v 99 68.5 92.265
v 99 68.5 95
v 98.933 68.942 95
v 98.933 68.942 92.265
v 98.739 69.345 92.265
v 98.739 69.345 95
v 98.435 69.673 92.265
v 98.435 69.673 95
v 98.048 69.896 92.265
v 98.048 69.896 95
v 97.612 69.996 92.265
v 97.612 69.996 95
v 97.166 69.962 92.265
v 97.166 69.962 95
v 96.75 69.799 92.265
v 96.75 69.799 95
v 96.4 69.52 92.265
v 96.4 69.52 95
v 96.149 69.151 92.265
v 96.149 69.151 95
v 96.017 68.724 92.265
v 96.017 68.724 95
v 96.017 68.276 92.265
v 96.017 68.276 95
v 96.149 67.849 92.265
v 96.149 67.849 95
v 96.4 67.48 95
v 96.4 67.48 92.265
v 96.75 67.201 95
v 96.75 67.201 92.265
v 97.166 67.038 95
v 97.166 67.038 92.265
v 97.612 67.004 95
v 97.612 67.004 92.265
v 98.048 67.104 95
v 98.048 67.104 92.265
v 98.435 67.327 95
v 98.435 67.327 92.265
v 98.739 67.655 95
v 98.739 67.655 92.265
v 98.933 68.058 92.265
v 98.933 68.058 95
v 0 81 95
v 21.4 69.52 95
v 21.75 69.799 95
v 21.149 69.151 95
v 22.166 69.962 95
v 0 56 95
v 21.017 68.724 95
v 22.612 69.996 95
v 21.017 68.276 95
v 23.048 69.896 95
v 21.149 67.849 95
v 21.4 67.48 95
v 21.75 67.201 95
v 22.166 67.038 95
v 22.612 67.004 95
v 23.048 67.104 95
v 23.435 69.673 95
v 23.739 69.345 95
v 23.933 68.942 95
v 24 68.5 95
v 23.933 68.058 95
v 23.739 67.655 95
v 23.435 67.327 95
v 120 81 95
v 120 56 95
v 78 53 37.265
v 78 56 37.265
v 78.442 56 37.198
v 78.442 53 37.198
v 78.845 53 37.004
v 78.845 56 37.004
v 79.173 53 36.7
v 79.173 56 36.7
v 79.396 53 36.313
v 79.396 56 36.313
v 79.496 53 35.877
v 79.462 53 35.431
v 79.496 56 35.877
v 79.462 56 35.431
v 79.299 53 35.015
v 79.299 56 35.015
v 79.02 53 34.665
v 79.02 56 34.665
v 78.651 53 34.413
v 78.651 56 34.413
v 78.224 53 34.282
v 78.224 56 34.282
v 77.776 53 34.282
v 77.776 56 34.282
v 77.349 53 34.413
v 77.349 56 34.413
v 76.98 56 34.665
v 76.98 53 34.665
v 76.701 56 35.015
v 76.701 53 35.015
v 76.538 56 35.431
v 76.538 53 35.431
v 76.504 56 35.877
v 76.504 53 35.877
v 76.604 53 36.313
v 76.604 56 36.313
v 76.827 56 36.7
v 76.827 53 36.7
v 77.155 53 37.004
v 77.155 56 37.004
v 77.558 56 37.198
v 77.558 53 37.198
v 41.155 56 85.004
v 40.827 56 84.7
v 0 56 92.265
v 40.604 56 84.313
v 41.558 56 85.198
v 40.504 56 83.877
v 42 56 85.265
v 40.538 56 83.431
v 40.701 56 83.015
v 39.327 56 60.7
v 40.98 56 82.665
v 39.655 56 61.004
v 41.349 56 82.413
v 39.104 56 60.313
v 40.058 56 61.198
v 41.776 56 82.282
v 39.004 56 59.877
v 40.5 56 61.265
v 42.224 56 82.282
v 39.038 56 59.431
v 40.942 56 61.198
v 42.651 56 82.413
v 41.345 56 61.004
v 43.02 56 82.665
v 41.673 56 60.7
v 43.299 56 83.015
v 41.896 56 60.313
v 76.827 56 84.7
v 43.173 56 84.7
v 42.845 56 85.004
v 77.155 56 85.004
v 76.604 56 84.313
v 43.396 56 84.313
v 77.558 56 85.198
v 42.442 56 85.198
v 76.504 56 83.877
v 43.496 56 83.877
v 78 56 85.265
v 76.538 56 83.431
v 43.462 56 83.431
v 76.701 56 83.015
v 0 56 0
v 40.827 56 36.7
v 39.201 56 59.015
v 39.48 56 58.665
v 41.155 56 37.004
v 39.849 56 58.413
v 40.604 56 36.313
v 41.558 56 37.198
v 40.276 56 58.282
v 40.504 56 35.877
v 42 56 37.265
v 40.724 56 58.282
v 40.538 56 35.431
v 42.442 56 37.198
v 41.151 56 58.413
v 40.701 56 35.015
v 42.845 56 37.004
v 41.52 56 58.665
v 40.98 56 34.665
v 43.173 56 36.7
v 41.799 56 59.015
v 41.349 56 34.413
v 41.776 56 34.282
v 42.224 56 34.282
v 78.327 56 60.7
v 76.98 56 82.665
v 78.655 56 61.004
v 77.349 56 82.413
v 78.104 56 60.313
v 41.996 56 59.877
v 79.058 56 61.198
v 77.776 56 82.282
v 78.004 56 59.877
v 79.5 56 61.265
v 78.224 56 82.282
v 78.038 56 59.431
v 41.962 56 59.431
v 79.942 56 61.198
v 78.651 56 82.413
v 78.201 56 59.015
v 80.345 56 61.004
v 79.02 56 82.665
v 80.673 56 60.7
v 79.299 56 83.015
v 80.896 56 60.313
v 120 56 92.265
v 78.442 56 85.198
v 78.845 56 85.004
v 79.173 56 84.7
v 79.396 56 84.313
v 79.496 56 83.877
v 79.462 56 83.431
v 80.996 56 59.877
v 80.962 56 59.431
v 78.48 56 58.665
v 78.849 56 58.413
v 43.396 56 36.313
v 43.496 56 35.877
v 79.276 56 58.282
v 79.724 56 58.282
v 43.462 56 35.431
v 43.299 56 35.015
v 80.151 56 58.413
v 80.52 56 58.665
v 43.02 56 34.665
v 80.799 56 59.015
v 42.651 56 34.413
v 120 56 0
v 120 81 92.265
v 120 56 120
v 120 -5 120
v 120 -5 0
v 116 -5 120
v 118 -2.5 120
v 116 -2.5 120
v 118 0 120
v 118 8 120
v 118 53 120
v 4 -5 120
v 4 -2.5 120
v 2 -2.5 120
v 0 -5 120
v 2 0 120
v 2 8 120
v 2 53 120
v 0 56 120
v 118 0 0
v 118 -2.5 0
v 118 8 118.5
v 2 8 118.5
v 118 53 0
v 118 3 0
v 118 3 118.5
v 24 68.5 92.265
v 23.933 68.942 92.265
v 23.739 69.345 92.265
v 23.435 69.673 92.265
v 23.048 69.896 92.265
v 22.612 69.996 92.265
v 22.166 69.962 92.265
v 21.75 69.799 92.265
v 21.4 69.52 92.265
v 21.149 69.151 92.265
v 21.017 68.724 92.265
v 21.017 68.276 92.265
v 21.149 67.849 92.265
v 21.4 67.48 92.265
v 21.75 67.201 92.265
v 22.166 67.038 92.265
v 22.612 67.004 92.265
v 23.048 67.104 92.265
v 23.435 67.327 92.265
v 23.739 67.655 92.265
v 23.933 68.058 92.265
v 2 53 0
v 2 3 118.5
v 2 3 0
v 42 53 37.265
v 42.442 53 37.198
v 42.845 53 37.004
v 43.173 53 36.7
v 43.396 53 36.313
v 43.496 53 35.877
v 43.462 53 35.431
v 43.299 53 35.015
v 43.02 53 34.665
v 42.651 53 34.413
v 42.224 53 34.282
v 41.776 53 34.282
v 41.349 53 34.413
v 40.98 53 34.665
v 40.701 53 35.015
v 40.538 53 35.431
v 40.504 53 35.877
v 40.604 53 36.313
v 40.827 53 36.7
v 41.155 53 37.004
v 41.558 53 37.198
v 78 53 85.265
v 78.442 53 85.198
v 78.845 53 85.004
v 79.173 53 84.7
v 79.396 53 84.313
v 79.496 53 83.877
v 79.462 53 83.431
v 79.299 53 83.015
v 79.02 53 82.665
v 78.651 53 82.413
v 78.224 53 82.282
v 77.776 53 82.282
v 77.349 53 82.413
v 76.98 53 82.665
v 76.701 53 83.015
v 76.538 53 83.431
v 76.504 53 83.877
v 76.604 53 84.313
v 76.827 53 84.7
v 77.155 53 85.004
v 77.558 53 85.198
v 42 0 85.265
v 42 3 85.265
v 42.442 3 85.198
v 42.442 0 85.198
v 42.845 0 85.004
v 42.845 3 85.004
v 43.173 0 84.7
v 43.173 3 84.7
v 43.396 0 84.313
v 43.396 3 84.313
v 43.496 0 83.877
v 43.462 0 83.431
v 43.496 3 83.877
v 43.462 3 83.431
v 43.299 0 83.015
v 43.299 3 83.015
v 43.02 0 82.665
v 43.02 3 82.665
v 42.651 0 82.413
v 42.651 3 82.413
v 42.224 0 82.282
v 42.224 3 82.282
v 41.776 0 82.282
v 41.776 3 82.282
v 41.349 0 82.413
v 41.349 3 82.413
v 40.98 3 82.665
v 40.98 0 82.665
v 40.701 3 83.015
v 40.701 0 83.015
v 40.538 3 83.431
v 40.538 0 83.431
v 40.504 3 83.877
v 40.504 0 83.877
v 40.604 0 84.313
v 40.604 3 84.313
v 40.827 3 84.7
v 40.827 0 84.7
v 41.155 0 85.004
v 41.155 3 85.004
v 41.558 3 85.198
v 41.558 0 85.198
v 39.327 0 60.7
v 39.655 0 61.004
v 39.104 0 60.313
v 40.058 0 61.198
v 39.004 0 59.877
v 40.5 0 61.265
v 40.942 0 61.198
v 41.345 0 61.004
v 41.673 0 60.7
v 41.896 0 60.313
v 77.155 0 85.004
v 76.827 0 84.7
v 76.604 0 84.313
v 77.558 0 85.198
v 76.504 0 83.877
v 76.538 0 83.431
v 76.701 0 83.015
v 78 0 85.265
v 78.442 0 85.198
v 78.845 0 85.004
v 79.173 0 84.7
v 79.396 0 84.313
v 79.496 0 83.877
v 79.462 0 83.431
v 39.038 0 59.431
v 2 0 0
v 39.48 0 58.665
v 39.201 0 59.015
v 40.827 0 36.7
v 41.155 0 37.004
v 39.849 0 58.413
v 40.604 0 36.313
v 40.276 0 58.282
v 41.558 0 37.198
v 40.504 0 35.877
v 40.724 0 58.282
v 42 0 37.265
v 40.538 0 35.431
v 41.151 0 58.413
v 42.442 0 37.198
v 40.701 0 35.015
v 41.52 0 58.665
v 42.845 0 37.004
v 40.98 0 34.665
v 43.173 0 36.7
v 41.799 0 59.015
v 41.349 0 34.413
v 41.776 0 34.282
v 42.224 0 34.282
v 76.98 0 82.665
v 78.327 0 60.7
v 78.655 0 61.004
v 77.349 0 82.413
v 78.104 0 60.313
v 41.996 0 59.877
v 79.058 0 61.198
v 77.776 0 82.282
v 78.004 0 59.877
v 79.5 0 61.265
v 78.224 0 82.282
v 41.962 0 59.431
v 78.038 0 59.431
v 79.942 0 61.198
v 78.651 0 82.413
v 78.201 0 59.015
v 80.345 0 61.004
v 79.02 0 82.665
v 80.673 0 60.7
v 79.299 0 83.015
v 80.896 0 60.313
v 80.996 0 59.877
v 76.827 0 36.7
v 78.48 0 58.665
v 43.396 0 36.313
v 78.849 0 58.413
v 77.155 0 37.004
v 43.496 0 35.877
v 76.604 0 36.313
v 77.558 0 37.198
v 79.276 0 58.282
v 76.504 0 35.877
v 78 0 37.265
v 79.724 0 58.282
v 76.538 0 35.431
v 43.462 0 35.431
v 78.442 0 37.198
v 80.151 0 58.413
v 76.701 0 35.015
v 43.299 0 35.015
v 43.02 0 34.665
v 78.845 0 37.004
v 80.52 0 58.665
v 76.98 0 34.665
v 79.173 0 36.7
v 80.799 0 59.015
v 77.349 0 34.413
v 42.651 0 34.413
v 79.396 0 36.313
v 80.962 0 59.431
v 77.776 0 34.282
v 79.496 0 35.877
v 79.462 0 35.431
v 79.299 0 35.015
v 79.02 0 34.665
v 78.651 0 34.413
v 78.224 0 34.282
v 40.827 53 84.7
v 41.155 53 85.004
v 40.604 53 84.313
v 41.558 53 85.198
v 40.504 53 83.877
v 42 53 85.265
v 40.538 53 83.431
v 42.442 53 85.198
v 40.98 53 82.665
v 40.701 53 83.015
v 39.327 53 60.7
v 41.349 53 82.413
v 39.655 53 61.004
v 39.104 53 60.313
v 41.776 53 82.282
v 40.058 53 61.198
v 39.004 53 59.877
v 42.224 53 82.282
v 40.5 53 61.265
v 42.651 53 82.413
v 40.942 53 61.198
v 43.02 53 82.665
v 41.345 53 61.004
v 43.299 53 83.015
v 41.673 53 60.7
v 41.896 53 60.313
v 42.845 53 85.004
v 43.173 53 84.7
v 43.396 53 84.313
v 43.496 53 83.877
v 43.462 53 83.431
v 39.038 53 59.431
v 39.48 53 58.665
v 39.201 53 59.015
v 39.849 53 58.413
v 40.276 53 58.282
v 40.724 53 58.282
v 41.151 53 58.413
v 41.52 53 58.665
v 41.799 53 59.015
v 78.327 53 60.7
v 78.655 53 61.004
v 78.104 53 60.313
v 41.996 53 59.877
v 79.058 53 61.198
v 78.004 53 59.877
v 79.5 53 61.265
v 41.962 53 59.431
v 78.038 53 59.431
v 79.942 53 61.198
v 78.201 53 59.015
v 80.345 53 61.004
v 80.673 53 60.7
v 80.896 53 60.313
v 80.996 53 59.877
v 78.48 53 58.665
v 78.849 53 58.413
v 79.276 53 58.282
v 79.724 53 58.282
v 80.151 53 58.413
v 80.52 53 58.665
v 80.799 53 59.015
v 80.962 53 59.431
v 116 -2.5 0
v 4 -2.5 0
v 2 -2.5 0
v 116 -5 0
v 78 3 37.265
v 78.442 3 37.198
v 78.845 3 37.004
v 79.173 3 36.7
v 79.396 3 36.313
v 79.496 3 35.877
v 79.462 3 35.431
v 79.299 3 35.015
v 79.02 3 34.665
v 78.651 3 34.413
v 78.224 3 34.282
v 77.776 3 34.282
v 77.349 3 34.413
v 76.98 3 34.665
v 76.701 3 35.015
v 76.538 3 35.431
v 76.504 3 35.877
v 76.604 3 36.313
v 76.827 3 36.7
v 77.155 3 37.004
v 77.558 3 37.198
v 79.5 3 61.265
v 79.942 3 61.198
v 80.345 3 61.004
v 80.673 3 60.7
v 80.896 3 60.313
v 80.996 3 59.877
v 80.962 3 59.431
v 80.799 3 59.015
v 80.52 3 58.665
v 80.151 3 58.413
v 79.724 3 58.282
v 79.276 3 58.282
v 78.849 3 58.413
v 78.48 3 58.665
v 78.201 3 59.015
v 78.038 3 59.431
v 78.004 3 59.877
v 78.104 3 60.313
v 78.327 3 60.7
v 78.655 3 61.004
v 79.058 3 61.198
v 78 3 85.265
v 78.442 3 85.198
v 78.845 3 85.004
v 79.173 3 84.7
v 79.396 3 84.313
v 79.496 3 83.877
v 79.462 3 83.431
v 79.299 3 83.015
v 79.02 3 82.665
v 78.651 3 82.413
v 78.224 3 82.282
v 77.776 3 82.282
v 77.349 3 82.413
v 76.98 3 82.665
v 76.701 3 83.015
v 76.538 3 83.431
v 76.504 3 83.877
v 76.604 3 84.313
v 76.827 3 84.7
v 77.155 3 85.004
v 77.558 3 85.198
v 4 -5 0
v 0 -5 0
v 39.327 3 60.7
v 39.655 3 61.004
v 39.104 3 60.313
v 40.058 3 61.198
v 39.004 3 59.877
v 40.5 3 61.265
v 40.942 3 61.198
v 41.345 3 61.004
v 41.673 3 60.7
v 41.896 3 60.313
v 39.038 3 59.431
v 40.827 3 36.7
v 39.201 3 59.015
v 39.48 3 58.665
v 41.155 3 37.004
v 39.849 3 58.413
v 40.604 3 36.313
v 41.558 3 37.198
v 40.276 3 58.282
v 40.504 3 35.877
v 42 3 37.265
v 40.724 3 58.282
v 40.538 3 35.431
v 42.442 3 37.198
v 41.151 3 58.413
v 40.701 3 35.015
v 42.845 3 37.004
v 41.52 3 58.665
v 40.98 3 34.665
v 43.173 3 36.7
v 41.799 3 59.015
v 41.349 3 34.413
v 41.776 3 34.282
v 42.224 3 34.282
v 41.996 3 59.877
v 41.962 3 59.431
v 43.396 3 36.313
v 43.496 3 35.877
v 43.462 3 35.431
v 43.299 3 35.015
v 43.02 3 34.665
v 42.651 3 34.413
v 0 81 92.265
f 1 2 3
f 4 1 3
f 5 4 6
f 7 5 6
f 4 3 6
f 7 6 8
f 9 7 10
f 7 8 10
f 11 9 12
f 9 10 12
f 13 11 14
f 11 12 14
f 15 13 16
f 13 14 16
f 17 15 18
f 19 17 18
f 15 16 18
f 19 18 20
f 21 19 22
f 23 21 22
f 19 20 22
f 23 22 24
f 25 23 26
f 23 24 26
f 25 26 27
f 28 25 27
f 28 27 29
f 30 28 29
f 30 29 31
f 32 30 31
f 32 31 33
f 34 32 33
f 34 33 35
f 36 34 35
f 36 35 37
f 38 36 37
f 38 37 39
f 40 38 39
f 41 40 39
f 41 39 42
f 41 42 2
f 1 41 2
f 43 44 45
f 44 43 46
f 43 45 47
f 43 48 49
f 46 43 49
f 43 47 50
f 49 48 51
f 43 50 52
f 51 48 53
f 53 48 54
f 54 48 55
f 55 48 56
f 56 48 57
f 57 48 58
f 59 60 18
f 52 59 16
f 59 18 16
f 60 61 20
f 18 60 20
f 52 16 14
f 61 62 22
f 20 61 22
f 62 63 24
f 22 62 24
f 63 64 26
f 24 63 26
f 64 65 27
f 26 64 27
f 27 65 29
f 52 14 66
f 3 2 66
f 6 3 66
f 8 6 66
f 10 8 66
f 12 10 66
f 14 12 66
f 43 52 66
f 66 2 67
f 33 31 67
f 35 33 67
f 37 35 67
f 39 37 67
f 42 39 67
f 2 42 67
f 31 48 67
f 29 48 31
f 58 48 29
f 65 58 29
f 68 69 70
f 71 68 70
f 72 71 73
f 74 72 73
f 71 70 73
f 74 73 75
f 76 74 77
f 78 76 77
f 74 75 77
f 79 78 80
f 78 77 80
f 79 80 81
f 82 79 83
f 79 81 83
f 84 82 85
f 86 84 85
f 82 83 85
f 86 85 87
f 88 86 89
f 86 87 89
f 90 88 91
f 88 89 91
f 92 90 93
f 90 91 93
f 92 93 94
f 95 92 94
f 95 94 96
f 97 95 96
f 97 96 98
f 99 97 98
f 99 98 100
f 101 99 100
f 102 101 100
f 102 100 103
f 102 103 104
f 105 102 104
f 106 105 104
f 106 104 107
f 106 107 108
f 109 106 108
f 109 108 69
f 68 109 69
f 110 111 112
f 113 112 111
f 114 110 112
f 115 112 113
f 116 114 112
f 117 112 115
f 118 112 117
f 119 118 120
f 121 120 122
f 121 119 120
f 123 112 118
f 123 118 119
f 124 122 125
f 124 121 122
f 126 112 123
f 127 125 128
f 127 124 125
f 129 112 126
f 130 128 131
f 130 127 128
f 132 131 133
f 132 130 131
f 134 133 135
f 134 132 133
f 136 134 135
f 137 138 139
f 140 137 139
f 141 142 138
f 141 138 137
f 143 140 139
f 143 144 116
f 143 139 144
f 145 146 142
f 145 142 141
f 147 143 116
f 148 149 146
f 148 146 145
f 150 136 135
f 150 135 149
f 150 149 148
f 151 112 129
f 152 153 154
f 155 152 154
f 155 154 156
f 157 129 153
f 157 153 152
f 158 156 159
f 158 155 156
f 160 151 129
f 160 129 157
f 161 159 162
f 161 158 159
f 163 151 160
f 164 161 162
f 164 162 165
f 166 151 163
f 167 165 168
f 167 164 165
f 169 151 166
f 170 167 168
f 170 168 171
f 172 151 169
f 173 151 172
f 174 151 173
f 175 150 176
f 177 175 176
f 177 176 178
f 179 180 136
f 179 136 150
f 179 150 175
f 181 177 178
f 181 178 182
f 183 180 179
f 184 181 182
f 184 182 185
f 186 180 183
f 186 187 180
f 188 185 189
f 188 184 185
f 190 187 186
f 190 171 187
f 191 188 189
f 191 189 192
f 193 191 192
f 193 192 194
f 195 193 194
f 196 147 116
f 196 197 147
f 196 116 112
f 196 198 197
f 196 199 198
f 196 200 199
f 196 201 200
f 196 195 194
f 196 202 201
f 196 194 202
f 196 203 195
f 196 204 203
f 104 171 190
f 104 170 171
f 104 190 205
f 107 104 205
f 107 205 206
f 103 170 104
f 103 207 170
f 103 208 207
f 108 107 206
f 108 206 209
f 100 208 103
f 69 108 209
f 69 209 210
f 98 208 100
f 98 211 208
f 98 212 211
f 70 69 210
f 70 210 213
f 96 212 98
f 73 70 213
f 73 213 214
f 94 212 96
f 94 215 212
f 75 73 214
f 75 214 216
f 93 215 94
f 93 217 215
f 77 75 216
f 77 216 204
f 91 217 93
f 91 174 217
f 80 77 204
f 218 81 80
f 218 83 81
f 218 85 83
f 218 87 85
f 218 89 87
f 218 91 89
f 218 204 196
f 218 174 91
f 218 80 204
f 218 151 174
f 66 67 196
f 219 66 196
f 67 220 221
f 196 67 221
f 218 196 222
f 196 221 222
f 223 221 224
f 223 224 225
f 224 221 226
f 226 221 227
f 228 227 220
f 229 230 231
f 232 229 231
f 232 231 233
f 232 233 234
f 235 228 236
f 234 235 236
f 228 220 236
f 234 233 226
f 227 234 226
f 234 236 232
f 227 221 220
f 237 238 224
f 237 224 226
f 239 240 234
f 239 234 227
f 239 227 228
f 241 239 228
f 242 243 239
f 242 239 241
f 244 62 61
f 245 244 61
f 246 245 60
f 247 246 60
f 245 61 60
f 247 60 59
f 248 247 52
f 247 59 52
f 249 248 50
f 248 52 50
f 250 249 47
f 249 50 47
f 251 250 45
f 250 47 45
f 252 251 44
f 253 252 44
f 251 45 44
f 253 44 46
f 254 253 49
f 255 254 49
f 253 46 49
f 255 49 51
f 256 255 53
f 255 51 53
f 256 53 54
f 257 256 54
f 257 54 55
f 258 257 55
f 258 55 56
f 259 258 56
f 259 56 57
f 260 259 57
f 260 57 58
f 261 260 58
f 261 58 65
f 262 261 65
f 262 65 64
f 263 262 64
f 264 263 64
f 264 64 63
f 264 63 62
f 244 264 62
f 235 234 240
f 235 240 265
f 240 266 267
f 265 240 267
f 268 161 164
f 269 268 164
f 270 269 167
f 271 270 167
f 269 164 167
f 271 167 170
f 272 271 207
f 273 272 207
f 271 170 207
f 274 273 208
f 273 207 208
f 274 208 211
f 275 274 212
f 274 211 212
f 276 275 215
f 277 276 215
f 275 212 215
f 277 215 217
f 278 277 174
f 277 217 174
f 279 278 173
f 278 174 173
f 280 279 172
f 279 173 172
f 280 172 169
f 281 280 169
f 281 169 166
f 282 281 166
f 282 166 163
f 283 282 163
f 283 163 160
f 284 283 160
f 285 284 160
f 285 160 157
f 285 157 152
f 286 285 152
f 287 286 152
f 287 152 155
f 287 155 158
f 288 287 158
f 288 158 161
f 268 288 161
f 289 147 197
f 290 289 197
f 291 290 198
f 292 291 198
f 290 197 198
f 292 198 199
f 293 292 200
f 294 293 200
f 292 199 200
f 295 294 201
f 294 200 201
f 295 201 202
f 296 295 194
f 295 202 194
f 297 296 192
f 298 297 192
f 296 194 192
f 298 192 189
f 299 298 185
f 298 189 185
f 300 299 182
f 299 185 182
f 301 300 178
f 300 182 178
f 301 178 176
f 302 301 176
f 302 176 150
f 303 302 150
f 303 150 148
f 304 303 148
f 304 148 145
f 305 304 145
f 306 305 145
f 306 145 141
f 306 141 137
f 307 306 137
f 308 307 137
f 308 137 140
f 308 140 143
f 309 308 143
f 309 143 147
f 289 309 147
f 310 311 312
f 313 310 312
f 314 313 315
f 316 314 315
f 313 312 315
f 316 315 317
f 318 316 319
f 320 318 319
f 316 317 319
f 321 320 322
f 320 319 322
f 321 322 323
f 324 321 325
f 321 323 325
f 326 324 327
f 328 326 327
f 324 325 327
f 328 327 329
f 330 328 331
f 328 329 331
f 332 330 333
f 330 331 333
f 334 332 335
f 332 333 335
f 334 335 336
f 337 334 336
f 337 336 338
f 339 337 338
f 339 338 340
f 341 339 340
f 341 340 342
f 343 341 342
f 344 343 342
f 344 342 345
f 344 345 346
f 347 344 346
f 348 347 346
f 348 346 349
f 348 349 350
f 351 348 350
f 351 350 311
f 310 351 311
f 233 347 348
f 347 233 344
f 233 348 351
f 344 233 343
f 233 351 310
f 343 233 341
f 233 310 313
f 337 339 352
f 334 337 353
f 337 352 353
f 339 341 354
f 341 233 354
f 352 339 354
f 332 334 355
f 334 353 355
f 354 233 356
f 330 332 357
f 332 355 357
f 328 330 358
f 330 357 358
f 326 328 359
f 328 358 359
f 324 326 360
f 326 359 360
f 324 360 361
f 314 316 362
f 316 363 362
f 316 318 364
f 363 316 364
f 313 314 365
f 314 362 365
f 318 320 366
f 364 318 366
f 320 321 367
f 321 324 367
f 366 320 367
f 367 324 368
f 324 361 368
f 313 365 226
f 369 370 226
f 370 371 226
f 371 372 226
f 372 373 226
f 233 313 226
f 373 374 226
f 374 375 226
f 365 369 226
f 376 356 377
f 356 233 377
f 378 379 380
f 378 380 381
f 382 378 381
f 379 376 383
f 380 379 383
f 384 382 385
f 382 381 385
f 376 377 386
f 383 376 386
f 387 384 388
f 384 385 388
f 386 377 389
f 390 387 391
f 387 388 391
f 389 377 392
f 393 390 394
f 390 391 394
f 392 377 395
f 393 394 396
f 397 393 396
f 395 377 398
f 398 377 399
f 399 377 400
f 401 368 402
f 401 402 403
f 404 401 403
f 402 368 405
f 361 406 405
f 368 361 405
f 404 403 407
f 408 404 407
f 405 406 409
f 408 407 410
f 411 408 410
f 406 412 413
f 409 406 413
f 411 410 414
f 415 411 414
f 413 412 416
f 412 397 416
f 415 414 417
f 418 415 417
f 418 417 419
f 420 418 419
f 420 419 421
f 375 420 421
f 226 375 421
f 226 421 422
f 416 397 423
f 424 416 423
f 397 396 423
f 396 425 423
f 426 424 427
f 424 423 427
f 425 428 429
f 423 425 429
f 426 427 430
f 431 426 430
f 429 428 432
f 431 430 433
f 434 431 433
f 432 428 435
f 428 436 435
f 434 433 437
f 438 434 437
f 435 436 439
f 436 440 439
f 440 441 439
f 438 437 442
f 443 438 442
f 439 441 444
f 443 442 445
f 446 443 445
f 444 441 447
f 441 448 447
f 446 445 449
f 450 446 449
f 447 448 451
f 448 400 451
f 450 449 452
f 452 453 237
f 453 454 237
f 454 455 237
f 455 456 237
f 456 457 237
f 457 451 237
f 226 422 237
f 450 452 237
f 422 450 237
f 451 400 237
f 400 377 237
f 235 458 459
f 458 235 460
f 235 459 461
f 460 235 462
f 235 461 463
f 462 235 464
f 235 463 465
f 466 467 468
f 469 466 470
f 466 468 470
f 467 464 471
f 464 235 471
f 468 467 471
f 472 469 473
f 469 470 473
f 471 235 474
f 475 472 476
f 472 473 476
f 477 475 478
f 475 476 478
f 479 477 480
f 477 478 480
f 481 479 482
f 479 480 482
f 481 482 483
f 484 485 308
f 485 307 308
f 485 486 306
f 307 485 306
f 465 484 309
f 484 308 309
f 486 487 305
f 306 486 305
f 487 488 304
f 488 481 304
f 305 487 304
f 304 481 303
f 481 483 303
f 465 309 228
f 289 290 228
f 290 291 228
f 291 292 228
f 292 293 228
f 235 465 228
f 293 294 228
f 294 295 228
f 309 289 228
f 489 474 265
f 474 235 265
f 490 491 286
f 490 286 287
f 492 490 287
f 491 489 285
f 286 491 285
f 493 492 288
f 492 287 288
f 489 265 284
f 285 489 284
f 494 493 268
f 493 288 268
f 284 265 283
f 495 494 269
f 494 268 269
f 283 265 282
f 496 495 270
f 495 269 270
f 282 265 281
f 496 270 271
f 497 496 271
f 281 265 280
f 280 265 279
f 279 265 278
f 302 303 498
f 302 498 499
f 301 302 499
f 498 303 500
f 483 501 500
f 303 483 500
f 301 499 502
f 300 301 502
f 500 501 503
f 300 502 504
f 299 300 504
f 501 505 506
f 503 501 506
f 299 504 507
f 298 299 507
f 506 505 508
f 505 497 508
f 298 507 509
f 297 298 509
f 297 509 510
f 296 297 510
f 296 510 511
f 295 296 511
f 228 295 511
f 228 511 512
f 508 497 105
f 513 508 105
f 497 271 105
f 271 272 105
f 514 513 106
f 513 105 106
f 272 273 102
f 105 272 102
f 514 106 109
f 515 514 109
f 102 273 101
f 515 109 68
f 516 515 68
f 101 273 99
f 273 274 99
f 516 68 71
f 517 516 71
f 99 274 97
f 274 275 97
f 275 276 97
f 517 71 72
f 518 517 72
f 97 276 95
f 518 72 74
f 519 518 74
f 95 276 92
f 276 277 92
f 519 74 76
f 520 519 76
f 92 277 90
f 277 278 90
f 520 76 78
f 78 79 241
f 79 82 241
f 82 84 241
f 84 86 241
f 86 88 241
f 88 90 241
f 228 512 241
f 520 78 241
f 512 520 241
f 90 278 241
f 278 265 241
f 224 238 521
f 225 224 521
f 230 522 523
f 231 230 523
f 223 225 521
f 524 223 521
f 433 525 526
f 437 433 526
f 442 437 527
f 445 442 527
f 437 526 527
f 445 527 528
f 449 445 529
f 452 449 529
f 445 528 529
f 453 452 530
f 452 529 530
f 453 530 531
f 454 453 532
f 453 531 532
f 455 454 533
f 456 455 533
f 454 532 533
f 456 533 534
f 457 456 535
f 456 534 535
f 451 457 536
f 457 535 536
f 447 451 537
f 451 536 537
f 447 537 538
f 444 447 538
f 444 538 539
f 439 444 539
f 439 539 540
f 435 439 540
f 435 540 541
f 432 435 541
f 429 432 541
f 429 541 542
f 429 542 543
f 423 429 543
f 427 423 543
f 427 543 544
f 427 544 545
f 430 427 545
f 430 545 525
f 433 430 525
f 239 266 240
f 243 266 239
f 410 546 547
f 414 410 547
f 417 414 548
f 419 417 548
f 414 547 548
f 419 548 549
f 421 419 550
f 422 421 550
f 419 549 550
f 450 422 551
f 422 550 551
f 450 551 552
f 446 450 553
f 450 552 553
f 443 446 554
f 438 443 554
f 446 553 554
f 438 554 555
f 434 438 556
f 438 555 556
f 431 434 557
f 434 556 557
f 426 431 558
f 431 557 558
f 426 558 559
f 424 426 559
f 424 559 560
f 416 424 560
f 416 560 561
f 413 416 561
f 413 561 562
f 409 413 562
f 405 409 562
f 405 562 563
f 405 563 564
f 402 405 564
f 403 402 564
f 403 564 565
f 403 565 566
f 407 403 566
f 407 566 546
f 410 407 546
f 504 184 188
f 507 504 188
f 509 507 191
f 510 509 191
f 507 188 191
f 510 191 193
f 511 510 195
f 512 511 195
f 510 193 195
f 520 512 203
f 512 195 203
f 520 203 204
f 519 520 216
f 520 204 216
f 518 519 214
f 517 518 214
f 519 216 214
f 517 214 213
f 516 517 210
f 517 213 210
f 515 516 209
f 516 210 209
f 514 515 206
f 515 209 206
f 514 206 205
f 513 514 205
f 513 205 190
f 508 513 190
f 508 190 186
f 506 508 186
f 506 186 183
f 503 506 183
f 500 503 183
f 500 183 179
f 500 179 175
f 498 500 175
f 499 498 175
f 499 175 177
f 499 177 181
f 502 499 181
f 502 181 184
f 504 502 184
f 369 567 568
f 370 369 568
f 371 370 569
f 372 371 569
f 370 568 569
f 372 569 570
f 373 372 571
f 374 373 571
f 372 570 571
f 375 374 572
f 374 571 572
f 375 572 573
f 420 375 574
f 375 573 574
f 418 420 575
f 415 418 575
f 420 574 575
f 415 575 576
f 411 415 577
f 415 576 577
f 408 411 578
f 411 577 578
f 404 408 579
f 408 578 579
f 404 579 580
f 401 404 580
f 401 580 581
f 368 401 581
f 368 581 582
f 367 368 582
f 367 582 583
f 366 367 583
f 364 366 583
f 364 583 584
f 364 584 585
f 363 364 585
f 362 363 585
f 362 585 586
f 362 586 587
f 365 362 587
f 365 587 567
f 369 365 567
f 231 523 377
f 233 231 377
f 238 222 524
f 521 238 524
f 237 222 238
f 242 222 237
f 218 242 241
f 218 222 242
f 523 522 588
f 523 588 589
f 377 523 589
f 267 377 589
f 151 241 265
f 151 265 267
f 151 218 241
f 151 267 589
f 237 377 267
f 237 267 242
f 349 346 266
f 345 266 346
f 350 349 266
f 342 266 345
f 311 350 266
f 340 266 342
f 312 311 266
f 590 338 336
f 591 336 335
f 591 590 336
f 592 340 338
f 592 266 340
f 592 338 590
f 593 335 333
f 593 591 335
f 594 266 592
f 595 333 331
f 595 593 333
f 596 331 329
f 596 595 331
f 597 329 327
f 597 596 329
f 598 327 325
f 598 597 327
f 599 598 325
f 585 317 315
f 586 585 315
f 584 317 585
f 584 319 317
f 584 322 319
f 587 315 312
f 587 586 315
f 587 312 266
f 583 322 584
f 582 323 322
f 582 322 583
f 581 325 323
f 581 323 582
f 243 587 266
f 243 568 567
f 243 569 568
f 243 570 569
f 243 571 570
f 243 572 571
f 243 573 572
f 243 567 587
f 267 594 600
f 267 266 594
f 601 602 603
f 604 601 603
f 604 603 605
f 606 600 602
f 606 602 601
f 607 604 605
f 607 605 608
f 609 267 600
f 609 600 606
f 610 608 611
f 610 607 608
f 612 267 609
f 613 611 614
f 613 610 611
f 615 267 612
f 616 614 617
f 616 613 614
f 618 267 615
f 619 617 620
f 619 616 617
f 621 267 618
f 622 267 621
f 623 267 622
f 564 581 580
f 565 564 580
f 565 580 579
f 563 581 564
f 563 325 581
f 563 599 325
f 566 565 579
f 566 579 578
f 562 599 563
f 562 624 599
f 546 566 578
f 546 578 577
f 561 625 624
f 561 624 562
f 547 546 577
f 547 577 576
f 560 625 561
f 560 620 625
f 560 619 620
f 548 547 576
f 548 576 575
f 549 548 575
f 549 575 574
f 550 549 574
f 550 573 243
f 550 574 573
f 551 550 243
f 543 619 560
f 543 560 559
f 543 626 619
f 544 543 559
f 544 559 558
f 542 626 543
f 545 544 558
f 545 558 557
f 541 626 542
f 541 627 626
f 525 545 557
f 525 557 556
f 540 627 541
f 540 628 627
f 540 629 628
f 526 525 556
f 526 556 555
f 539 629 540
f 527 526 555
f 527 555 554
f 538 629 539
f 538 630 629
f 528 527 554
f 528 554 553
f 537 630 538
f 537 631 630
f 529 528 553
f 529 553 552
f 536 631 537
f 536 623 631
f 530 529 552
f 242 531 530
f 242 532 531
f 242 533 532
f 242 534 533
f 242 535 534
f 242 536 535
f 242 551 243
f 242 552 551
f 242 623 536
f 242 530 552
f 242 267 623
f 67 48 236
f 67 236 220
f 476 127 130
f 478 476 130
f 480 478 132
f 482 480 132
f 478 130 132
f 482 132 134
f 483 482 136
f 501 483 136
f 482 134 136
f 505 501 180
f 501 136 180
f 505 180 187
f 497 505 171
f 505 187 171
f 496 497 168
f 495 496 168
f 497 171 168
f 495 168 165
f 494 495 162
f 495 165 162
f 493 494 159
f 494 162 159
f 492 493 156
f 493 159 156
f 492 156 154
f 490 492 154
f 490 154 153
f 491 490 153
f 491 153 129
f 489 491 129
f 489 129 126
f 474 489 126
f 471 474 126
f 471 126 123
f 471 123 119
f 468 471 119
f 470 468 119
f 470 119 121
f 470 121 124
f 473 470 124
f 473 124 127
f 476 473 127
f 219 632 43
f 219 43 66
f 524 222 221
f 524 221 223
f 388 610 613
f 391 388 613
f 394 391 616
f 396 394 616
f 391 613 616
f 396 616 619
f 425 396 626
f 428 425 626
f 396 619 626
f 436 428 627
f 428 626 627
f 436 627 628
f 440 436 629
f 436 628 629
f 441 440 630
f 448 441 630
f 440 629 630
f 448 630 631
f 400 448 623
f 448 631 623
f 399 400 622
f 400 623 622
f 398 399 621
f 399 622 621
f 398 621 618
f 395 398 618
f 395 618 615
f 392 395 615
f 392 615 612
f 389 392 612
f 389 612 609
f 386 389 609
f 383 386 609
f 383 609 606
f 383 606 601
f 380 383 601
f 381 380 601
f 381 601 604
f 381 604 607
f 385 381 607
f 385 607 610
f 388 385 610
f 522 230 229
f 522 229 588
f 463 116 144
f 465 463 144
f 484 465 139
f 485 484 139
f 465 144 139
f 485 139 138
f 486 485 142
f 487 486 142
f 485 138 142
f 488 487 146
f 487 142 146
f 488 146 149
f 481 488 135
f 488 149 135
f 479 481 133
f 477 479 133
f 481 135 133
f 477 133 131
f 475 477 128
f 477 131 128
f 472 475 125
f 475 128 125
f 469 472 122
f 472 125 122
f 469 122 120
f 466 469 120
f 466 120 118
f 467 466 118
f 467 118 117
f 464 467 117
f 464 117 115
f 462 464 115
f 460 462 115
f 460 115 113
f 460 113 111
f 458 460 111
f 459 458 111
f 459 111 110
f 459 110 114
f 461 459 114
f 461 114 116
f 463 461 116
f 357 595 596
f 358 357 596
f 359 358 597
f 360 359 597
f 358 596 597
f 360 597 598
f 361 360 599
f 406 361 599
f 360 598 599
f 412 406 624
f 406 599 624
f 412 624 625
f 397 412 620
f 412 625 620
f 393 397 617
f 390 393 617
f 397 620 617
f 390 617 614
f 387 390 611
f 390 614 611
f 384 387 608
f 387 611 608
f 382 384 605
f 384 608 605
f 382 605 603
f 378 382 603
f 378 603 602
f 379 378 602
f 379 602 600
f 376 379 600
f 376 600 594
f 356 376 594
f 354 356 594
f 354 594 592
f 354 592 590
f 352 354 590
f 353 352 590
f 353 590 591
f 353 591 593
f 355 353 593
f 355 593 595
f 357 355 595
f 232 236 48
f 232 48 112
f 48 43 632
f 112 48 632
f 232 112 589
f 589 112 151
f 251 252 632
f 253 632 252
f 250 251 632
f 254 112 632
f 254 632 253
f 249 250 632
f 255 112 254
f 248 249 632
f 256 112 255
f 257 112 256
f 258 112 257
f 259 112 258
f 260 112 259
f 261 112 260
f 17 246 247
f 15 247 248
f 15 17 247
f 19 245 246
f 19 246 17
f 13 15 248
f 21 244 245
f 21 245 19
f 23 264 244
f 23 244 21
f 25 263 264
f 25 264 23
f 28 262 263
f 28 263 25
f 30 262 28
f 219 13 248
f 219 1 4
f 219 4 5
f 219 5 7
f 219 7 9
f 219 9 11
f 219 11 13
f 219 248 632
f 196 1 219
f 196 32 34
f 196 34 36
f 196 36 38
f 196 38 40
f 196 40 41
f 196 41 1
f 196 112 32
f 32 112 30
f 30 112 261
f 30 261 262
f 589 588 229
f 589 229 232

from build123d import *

# Parameters (mm, degrees)
SKETCH_2_W          = 120
SKETCH_2_H          = 120
EXTRUDE_1_DEPTH     = 3
SKETCH_5_W          = 2
SKETCH_5_H          = 120
EXTRUDE_3_DEPTH     = 50
SKETCH_6_W          = 120
SKETCH_6_H          = 120
EXTRUDE_4_DEPTH     = 3
SKETCH_7_W          = 116
SKETCH_7_H          = 1.5
EXTRUDE_5_DEPTH     = 5
SKETCH_9_W          = 120
SKETCH_9_H          = 2.735218368
EXTRUDE_6_DEPTH     = 25
SKETCH_11_R         = 1.5
CUT_EXTRUDE_1_DEPTH = 58
SKETCH_10_R         = 1.5
CUT_EXTRUDE_2_DEPTH = 3
SKETCH_13_W         = 4
SKETCH_13_H         = 120
EXTRUDE_10_DEPTH    = 5
SKETCH_14_W         = 2
SKETCH_14_H         = 2.5
CUT_EXTRUDE_3_DEPTH = 120


with BuildPart() as part:
    # 草图2 → 凸台-拉伸1 (new body)
    with BuildSketch(Plane(origin=(0, 0, 0), x_dir=(1, 0, 0), z_dir=(0, 1, 0))):
        with Locations((60, -60)):
            Rectangle(SKETCH_2_W, SKETCH_2_H)
    extrude(amount=EXTRUDE_1_DEPTH)

    # 草图5 → 凸台-拉伸3 (add)
    with BuildSketch(Plane(origin=(0, 3, 0), x_dir=(1, 0, 0), z_dir=(0, 1, 0))):
        with Locations((1, -60)):
            Rectangle(SKETCH_5_W, SKETCH_5_H)
        with Locations((119, -60)):
            Rectangle(SKETCH_5_W, SKETCH_5_H)
    extrude(amount=EXTRUDE_3_DEPTH)

    # 草图6 → 凸台-拉伸4 (add)
    with BuildSketch(Plane(origin=(0, 53, 0), x_dir=(1, 0, 0), z_dir=(0, 1, 0))):
        with Locations((60, -60)):
            Rectangle(SKETCH_6_W, SKETCH_6_H)
    extrude(amount=EXTRUDE_4_DEPTH)

    # 草图7 → 凸台-拉伸5 (add)
    with BuildSketch(Plane(origin=(0, 3, 0), x_dir=(1, 0, 0), z_dir=(0, 1, 0))):
        with Locations((60, -119.25)):
            Rectangle(SKETCH_7_W, SKETCH_7_H)
    extrude(amount=EXTRUDE_5_DEPTH)

    # 草图9 → 凸台-拉伸6 (add)
    with BuildSketch(Plane(origin=(0, 56, 0), x_dir=(1, 0, 0), z_dir=(0, 1, 0))):
        with Locations((60, -93.632390816)):
            Rectangle(SKETCH_9_W, SKETCH_9_H)
    extrude(amount=EXTRUDE_6_DEPTH)

    # 草图11 → 切除-拉伸1 (cut)
    with BuildSketch(Plane(origin=(0, 56, 0), x_dir=(1, 0, 0), z_dir=(0, 1, 0))):
        with Locations(Location((42, -35.764781632, 0), (0, 0, 270))):
            Circle(SKETCH_11_R)
        with Locations(Location((40.5, -59.764781632, 0), (0, 0, 270))):
            Circle(SKETCH_11_R)
        with Locations(Location((42, -83.764781632, 0), (0, 0, 270))):
            Circle(SKETCH_11_R)
        with Locations(Location((79.5, -59.764781632, 0), (0, 0, 270))):
            Circle(SKETCH_11_R)
        with Locations(Location((78, -83.764781632, 0), (0, 0, 270))):
            Circle(SKETCH_11_R)
        with Locations(Location((78, -35.764781632, 0), (0, 0, 270))):
            Circle(SKETCH_11_R)
    extrude(amount=-CUT_EXTRUDE_1_DEPTH, mode=Mode.SUBTRACT)

    # 草图10 → 切除-拉伸2 (cut)
    with BuildSketch(Plane.XY.offset(95)):
        with Locations((22.5, 68.5)):
            Circle(SKETCH_10_R)
        with Locations((97.5, 68.5)):
            Circle(SKETCH_10_R)
    extrude(amount=-CUT_EXTRUDE_2_DEPTH, mode=Mode.SUBTRACT)

    # 草图13 → 凸台-拉伸10 (add)
    with BuildSketch(Plane(origin=(0, 0, 0), x_dir=(-1, 0, 0), z_dir=(0, -1, 0))):
        with Locations((-2, -60)):
            Rectangle(SKETCH_13_W, SKETCH_13_H)
        with Locations((-118, -60)):
            Rectangle(SKETCH_13_W, SKETCH_13_H)
    extrude(amount=EXTRUDE_10_DEPTH)

    # 草图14 → 切除-拉伸3 (cut)
    with BuildSketch(Plane(origin=(0, 0, 0), x_dir=(-1, 0, 0), z_dir=(0, 0, -1))):
        with Locations((-117, -1.25)):
            Rectangle(SKETCH_14_W, SKETCH_14_H)
        with Locations((-3, -1.25)):
            Rectangle(SKETCH_14_W, SKETCH_14_H)
    extrude(amount=-CUT_EXTRUDE_3_DEPTH, mode=Mode.SUBTRACT)


solid = part.part
